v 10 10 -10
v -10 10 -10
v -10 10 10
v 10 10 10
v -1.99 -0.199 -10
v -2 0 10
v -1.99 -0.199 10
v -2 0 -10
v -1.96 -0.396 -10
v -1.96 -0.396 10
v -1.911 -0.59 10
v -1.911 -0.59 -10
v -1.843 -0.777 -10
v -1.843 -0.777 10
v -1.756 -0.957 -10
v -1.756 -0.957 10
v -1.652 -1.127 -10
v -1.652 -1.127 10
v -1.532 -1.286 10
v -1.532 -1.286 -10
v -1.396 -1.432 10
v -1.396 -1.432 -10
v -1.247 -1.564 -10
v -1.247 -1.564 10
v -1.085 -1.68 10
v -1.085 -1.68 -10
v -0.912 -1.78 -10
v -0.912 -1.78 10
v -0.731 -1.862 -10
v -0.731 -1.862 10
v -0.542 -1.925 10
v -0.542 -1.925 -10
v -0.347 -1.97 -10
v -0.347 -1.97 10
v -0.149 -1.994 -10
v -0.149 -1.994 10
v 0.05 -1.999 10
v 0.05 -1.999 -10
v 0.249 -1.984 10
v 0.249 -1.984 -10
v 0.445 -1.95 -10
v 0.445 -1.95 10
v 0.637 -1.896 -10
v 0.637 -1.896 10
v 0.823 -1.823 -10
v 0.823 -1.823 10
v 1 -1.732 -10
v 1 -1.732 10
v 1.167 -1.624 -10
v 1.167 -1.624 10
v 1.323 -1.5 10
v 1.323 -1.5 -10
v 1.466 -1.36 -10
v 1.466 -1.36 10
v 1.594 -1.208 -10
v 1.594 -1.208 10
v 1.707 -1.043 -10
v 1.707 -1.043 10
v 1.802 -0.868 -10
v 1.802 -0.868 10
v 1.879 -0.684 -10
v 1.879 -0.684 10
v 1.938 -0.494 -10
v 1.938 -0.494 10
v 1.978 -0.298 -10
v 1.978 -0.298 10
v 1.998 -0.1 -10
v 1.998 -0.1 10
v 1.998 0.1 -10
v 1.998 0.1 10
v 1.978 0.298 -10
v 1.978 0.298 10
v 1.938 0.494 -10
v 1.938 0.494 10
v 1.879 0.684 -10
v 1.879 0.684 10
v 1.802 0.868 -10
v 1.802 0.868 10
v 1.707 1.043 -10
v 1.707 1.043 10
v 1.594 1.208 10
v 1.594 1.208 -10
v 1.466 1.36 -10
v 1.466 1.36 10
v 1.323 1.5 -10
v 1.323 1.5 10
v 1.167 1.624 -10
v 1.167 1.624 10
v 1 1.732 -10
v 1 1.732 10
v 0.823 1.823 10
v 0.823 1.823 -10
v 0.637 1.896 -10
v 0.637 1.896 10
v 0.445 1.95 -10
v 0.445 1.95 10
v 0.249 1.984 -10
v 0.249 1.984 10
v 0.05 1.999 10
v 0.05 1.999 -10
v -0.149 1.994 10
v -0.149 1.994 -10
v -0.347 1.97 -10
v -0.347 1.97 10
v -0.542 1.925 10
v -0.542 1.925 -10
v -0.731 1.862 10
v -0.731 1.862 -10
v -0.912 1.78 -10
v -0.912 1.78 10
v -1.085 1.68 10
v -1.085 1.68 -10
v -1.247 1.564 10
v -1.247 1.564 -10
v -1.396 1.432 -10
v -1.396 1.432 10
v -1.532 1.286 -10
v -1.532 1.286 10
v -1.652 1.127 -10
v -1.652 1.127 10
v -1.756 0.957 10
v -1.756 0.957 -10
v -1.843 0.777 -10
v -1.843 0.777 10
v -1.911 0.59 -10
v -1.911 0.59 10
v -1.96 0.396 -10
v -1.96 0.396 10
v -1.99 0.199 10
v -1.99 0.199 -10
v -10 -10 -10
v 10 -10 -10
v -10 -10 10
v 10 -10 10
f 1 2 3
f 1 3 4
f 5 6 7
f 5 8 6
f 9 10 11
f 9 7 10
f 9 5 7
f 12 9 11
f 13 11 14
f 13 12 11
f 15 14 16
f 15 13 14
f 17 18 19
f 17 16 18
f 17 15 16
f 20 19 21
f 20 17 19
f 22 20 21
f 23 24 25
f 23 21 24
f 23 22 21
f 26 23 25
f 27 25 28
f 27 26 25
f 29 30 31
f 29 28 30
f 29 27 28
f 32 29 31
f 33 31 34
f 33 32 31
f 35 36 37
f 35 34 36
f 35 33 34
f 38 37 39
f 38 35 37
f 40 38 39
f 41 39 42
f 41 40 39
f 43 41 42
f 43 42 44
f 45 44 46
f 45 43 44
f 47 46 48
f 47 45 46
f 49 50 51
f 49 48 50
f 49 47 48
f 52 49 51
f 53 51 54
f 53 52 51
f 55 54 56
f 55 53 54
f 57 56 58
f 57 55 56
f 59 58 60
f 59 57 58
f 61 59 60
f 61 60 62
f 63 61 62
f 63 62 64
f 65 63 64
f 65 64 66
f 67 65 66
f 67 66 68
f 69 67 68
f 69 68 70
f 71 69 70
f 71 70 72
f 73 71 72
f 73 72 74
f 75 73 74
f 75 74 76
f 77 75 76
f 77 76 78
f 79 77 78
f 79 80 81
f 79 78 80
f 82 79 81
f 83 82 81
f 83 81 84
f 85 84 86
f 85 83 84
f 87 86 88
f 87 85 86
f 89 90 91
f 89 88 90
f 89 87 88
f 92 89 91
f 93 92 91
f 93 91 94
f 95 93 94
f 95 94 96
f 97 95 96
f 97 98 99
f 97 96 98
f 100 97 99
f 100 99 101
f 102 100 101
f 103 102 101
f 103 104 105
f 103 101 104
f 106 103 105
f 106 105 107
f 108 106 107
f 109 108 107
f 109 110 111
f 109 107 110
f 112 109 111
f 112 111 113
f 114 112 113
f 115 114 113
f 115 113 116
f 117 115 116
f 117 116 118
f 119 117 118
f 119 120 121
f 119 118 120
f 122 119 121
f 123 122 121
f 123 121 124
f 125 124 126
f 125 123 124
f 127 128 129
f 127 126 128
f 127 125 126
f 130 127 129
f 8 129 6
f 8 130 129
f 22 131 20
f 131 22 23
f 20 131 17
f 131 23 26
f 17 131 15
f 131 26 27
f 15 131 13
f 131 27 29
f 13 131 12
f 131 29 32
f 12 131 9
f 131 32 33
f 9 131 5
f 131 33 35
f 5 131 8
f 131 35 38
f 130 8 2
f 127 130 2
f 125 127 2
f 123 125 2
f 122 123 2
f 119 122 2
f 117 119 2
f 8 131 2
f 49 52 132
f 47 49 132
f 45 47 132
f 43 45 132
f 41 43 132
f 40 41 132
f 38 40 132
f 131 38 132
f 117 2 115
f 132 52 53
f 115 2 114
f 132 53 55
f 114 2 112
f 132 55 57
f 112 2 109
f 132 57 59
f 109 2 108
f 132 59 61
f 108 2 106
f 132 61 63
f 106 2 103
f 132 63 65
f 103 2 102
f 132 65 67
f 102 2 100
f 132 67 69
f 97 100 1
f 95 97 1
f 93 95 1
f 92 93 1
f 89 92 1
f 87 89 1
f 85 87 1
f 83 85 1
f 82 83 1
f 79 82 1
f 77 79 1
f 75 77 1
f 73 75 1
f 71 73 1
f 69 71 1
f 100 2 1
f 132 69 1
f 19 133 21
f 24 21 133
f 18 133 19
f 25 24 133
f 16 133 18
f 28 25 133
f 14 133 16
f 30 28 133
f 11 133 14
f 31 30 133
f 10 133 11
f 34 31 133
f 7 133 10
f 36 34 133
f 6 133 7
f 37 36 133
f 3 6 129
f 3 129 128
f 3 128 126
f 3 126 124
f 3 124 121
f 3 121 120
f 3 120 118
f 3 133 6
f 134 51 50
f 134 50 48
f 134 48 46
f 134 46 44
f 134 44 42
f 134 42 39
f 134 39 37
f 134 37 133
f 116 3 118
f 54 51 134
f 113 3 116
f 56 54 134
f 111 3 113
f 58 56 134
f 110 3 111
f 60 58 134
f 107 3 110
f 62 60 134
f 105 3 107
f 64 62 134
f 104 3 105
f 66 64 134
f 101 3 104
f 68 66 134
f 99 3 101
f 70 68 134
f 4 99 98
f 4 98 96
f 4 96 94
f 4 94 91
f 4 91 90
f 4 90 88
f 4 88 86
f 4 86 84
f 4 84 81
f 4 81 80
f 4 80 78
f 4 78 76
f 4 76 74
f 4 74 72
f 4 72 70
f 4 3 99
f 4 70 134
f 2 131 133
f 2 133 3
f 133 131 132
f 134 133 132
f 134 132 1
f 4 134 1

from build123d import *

# Parameters (mm, degrees)
TEST_BOX_START     = -10
TEST_BOX_PROFILE_W = 20
TEST_BOX_PROFILE_H = 20
TEST_BOX_DEPTH     = 20
TEST_CUT_START     = -12
TEST_CUT_PROFILE_R = 2
TEST_CUT_DEPTH     = 24


with BuildPart() as part:
    # Test_box_Profile → Test_box (new body)
    with BuildSketch(Plane.XY.offset(TEST_BOX_START)):
        Rectangle(TEST_BOX_PROFILE_W, TEST_BOX_PROFILE_H)
    extrude(amount=TEST_BOX_DEPTH)

    # Test_cut_Profile → Test_cut (cut)
    with BuildSketch(Plane.XY.offset(TEST_CUT_START)):
        with Locations(Location((0, 0, 0), (0, 0, 180))):
            Circle(TEST_CUT_PROFILE_R)
    extrude(amount=TEST_CUT_DEPTH, mode=Mode.SUBTRACT)


solid = part.part
